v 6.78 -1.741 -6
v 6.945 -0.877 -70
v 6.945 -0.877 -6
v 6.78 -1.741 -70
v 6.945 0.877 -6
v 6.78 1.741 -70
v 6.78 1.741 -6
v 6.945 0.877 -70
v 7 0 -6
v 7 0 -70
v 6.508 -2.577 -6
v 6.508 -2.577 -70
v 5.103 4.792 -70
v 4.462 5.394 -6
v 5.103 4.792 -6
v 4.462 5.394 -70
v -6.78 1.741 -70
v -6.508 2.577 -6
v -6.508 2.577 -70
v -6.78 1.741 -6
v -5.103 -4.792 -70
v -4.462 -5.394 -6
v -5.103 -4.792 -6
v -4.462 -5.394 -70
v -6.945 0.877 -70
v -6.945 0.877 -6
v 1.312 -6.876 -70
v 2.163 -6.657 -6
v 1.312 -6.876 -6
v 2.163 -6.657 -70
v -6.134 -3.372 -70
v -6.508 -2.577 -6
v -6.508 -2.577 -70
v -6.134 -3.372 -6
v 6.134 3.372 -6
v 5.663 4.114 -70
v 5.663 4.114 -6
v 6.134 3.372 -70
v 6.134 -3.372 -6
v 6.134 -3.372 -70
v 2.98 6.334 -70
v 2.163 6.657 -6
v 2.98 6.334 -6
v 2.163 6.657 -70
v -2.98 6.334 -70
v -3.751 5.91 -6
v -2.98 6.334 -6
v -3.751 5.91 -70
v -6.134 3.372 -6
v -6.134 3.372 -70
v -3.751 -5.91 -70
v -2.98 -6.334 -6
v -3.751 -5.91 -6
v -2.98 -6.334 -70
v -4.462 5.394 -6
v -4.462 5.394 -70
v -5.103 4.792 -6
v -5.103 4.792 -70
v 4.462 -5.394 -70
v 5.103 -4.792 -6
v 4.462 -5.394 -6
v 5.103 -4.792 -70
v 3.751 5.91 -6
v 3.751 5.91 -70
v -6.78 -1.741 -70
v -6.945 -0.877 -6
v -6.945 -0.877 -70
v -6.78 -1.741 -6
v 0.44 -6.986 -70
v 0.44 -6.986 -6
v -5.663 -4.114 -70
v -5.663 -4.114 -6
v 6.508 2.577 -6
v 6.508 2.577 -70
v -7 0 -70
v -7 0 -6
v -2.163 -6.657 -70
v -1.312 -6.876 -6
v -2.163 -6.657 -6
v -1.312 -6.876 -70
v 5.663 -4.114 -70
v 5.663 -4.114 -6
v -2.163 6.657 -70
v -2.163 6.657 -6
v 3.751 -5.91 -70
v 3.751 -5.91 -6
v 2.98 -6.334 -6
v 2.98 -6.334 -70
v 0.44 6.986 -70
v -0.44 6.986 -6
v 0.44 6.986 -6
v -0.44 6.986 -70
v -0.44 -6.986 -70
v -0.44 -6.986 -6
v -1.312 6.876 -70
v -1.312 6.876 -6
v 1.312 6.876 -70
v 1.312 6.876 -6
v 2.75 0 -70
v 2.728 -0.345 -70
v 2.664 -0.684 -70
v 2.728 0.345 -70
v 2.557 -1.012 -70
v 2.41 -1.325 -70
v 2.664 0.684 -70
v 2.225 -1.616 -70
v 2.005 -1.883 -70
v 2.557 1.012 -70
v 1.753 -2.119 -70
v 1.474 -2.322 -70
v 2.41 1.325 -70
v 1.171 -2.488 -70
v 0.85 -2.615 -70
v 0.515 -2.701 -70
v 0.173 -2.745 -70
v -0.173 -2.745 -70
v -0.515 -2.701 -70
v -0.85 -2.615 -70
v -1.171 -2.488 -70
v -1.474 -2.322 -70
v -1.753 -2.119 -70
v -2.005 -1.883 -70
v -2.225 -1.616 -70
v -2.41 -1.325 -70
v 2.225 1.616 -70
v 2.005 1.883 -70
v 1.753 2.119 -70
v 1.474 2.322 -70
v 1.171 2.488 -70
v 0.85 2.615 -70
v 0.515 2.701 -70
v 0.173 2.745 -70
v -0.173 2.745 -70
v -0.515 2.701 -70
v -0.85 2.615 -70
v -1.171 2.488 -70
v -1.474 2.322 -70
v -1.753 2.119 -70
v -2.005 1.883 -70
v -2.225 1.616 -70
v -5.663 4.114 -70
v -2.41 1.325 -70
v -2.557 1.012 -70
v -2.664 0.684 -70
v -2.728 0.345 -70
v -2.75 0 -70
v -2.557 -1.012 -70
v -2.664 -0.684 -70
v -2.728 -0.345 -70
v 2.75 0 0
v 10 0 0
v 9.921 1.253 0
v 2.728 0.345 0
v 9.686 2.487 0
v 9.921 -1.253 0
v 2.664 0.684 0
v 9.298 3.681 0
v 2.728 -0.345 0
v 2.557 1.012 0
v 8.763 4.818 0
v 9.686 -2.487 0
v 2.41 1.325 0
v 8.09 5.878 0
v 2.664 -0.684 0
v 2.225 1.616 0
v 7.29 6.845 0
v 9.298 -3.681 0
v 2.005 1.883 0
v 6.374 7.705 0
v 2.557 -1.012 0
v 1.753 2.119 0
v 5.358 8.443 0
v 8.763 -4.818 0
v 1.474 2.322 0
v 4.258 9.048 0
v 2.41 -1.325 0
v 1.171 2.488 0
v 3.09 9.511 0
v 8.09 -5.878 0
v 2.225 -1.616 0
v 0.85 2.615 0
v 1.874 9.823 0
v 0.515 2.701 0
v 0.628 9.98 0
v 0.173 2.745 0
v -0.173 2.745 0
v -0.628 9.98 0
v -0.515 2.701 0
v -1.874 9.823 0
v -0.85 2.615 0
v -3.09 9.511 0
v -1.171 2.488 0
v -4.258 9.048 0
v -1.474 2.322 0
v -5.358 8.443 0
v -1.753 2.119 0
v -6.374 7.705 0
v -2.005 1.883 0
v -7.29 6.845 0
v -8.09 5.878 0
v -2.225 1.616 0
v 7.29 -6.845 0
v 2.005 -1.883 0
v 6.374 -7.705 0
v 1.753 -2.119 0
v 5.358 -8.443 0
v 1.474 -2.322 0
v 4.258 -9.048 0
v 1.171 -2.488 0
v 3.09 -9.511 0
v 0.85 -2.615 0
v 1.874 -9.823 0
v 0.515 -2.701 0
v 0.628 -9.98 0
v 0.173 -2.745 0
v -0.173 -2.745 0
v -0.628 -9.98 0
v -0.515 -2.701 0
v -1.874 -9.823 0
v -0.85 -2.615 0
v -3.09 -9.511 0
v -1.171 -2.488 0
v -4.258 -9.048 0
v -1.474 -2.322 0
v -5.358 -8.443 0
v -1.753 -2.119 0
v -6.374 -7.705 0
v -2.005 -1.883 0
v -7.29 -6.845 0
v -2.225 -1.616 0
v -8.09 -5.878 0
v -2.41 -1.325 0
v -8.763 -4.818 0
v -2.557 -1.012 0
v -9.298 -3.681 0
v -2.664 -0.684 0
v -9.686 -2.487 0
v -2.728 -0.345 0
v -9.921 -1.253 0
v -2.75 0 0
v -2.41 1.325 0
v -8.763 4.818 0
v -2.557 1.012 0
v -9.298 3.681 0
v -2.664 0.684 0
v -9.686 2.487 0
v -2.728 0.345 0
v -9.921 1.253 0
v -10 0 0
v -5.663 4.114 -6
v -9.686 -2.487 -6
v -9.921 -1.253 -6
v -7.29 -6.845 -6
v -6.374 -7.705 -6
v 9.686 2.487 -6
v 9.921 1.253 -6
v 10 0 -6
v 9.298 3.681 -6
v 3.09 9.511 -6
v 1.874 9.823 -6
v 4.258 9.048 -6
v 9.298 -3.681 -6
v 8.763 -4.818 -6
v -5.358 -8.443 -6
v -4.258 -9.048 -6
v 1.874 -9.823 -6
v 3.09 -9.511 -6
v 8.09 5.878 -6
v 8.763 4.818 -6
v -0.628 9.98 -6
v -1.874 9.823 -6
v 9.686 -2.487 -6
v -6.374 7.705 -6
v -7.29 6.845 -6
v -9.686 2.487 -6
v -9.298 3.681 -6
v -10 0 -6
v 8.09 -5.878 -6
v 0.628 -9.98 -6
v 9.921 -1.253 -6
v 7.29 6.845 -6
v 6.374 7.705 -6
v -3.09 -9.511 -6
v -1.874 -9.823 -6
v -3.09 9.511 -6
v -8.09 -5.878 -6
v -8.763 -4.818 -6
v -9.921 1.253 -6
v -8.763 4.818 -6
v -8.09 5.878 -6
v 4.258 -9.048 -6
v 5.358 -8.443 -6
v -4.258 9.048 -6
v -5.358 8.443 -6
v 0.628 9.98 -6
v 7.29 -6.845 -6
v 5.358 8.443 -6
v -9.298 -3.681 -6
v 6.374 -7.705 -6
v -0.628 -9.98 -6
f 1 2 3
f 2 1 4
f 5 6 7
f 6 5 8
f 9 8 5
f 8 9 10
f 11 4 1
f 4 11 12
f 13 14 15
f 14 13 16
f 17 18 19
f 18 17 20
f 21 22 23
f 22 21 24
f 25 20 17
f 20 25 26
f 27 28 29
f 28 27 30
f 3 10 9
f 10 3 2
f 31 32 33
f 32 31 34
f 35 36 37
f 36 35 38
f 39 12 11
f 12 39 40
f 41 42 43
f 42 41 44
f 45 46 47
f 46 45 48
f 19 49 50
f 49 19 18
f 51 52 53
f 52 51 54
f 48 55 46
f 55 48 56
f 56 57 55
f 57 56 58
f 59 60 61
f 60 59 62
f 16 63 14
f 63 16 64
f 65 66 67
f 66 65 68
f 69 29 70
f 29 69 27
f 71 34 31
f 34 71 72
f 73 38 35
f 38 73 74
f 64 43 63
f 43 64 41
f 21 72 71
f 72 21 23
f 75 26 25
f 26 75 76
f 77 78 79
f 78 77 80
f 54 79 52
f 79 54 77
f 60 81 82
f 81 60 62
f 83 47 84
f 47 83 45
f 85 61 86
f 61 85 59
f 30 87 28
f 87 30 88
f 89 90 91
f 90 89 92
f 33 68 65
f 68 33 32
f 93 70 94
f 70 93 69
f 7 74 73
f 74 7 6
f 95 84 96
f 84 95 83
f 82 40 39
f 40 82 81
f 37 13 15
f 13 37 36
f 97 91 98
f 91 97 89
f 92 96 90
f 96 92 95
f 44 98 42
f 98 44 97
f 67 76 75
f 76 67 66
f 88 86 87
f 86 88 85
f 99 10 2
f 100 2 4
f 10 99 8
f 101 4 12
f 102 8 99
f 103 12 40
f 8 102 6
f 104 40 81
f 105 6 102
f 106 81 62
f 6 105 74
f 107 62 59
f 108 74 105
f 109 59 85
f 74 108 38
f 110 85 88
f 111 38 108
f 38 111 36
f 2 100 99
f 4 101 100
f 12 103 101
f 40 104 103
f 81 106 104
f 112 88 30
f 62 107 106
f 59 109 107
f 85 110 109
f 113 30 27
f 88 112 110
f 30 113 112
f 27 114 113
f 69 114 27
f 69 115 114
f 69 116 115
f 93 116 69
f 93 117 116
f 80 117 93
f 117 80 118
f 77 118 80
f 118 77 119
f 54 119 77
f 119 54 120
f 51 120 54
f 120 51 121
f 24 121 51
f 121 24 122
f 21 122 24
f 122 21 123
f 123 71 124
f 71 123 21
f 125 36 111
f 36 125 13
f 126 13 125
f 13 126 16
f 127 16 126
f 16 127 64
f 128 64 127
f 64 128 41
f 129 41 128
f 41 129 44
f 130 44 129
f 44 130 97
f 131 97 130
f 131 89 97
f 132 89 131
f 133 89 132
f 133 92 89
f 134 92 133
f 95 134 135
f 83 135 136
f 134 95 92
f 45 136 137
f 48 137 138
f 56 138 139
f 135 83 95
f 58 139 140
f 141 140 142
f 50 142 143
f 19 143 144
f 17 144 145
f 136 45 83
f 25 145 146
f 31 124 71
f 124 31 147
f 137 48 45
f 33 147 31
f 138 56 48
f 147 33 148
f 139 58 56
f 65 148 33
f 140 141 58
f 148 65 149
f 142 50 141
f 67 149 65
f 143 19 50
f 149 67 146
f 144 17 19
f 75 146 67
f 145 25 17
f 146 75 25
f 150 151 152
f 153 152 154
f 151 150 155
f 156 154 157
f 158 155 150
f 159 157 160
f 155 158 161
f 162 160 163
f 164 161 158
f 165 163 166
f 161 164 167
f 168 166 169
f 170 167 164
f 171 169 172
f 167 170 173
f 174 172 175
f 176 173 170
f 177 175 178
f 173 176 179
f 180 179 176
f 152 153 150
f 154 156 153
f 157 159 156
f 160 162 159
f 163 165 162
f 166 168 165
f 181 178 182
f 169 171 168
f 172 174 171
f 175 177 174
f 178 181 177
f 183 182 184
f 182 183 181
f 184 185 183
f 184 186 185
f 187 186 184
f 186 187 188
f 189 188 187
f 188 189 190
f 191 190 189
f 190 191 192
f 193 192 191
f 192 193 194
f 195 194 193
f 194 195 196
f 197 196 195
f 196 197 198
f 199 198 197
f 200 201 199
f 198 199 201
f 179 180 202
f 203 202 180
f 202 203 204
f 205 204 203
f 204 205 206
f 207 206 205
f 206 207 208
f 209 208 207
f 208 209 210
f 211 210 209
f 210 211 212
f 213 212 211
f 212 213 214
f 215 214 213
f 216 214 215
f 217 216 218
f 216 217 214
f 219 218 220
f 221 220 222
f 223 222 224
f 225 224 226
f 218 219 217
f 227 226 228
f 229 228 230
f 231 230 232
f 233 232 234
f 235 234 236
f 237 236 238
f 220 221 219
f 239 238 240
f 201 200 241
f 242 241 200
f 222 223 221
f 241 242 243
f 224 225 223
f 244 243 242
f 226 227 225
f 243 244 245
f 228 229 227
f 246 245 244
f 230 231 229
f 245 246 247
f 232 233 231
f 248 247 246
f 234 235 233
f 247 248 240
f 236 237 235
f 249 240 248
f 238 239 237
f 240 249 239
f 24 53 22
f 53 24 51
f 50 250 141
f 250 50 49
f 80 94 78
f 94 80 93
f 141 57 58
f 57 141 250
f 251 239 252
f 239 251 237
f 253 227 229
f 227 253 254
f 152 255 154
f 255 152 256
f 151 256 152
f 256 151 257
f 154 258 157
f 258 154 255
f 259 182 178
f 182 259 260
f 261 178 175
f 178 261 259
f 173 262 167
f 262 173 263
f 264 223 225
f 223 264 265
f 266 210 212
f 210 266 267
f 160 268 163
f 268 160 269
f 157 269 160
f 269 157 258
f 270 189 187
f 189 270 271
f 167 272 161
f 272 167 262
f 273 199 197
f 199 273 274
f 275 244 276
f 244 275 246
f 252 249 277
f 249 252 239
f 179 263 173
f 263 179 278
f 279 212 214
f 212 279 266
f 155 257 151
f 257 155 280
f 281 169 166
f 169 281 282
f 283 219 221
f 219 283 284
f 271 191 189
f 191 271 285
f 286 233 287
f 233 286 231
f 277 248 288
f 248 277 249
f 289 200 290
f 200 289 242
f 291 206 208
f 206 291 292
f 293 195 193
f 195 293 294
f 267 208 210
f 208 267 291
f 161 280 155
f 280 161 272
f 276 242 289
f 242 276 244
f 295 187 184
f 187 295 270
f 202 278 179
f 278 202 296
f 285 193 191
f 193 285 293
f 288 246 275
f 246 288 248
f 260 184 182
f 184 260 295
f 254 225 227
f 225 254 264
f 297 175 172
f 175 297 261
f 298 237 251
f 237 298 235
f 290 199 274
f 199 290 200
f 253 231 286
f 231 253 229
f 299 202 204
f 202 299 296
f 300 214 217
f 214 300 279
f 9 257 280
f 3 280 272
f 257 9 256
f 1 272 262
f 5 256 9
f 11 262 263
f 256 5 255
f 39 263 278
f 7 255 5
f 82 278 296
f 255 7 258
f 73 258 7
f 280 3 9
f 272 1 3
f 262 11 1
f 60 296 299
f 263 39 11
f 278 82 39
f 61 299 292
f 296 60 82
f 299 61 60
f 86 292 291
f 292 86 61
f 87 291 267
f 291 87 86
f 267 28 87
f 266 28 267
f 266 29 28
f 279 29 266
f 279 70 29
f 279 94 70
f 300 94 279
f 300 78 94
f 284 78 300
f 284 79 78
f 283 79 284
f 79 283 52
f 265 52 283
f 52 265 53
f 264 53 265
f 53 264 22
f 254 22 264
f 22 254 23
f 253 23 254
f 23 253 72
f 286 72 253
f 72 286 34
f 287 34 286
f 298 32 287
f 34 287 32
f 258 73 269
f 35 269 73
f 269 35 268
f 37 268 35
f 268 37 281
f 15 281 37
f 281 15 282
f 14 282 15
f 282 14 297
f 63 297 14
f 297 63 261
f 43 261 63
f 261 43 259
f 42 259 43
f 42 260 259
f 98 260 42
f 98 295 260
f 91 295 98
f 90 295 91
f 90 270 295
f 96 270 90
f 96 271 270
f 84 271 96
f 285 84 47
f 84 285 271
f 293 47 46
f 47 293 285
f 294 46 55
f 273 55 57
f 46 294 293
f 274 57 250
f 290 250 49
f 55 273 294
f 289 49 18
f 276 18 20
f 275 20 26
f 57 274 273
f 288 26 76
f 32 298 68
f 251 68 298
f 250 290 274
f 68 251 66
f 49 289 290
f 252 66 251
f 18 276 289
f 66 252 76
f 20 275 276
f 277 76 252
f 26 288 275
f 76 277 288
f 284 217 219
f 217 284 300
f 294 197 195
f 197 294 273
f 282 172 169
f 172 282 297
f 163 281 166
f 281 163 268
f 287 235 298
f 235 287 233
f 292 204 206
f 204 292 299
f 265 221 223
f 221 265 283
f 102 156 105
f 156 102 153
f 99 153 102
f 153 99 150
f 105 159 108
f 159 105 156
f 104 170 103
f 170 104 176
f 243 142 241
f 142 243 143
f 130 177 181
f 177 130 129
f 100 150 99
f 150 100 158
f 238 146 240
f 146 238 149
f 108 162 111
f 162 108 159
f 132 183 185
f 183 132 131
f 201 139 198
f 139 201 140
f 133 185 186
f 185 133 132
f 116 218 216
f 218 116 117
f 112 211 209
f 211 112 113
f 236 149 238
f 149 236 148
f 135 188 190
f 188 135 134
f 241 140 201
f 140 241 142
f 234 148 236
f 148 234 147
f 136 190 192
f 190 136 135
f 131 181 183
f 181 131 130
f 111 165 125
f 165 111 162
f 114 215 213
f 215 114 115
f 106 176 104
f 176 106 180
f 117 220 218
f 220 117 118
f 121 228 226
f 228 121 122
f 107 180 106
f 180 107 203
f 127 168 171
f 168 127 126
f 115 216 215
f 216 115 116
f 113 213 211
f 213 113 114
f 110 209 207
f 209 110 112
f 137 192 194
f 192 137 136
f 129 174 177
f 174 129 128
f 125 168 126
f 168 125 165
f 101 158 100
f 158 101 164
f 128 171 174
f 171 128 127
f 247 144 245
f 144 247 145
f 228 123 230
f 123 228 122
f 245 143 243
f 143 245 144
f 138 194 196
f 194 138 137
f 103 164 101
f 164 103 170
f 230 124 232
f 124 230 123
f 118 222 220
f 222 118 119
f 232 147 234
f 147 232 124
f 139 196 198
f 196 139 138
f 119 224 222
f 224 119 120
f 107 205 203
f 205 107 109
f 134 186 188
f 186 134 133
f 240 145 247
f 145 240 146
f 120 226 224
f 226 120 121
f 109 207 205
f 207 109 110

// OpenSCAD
$fn = 50;


difference() {
	union() {
		translate(v = [0, 0, -70.0000000000]) {
			cylinder(h = 70, r = 7.0000000000);
		}
		translate(v = [0, 0, -6.0000000000]) {
			cylinder(h = 6, r = 10.0000000000);
		}
	}
	union() {
		#translate(v = [0, 0, -70]) {
			cylinder(h = 70, r = 2.7500000000);
		}
	}
}
